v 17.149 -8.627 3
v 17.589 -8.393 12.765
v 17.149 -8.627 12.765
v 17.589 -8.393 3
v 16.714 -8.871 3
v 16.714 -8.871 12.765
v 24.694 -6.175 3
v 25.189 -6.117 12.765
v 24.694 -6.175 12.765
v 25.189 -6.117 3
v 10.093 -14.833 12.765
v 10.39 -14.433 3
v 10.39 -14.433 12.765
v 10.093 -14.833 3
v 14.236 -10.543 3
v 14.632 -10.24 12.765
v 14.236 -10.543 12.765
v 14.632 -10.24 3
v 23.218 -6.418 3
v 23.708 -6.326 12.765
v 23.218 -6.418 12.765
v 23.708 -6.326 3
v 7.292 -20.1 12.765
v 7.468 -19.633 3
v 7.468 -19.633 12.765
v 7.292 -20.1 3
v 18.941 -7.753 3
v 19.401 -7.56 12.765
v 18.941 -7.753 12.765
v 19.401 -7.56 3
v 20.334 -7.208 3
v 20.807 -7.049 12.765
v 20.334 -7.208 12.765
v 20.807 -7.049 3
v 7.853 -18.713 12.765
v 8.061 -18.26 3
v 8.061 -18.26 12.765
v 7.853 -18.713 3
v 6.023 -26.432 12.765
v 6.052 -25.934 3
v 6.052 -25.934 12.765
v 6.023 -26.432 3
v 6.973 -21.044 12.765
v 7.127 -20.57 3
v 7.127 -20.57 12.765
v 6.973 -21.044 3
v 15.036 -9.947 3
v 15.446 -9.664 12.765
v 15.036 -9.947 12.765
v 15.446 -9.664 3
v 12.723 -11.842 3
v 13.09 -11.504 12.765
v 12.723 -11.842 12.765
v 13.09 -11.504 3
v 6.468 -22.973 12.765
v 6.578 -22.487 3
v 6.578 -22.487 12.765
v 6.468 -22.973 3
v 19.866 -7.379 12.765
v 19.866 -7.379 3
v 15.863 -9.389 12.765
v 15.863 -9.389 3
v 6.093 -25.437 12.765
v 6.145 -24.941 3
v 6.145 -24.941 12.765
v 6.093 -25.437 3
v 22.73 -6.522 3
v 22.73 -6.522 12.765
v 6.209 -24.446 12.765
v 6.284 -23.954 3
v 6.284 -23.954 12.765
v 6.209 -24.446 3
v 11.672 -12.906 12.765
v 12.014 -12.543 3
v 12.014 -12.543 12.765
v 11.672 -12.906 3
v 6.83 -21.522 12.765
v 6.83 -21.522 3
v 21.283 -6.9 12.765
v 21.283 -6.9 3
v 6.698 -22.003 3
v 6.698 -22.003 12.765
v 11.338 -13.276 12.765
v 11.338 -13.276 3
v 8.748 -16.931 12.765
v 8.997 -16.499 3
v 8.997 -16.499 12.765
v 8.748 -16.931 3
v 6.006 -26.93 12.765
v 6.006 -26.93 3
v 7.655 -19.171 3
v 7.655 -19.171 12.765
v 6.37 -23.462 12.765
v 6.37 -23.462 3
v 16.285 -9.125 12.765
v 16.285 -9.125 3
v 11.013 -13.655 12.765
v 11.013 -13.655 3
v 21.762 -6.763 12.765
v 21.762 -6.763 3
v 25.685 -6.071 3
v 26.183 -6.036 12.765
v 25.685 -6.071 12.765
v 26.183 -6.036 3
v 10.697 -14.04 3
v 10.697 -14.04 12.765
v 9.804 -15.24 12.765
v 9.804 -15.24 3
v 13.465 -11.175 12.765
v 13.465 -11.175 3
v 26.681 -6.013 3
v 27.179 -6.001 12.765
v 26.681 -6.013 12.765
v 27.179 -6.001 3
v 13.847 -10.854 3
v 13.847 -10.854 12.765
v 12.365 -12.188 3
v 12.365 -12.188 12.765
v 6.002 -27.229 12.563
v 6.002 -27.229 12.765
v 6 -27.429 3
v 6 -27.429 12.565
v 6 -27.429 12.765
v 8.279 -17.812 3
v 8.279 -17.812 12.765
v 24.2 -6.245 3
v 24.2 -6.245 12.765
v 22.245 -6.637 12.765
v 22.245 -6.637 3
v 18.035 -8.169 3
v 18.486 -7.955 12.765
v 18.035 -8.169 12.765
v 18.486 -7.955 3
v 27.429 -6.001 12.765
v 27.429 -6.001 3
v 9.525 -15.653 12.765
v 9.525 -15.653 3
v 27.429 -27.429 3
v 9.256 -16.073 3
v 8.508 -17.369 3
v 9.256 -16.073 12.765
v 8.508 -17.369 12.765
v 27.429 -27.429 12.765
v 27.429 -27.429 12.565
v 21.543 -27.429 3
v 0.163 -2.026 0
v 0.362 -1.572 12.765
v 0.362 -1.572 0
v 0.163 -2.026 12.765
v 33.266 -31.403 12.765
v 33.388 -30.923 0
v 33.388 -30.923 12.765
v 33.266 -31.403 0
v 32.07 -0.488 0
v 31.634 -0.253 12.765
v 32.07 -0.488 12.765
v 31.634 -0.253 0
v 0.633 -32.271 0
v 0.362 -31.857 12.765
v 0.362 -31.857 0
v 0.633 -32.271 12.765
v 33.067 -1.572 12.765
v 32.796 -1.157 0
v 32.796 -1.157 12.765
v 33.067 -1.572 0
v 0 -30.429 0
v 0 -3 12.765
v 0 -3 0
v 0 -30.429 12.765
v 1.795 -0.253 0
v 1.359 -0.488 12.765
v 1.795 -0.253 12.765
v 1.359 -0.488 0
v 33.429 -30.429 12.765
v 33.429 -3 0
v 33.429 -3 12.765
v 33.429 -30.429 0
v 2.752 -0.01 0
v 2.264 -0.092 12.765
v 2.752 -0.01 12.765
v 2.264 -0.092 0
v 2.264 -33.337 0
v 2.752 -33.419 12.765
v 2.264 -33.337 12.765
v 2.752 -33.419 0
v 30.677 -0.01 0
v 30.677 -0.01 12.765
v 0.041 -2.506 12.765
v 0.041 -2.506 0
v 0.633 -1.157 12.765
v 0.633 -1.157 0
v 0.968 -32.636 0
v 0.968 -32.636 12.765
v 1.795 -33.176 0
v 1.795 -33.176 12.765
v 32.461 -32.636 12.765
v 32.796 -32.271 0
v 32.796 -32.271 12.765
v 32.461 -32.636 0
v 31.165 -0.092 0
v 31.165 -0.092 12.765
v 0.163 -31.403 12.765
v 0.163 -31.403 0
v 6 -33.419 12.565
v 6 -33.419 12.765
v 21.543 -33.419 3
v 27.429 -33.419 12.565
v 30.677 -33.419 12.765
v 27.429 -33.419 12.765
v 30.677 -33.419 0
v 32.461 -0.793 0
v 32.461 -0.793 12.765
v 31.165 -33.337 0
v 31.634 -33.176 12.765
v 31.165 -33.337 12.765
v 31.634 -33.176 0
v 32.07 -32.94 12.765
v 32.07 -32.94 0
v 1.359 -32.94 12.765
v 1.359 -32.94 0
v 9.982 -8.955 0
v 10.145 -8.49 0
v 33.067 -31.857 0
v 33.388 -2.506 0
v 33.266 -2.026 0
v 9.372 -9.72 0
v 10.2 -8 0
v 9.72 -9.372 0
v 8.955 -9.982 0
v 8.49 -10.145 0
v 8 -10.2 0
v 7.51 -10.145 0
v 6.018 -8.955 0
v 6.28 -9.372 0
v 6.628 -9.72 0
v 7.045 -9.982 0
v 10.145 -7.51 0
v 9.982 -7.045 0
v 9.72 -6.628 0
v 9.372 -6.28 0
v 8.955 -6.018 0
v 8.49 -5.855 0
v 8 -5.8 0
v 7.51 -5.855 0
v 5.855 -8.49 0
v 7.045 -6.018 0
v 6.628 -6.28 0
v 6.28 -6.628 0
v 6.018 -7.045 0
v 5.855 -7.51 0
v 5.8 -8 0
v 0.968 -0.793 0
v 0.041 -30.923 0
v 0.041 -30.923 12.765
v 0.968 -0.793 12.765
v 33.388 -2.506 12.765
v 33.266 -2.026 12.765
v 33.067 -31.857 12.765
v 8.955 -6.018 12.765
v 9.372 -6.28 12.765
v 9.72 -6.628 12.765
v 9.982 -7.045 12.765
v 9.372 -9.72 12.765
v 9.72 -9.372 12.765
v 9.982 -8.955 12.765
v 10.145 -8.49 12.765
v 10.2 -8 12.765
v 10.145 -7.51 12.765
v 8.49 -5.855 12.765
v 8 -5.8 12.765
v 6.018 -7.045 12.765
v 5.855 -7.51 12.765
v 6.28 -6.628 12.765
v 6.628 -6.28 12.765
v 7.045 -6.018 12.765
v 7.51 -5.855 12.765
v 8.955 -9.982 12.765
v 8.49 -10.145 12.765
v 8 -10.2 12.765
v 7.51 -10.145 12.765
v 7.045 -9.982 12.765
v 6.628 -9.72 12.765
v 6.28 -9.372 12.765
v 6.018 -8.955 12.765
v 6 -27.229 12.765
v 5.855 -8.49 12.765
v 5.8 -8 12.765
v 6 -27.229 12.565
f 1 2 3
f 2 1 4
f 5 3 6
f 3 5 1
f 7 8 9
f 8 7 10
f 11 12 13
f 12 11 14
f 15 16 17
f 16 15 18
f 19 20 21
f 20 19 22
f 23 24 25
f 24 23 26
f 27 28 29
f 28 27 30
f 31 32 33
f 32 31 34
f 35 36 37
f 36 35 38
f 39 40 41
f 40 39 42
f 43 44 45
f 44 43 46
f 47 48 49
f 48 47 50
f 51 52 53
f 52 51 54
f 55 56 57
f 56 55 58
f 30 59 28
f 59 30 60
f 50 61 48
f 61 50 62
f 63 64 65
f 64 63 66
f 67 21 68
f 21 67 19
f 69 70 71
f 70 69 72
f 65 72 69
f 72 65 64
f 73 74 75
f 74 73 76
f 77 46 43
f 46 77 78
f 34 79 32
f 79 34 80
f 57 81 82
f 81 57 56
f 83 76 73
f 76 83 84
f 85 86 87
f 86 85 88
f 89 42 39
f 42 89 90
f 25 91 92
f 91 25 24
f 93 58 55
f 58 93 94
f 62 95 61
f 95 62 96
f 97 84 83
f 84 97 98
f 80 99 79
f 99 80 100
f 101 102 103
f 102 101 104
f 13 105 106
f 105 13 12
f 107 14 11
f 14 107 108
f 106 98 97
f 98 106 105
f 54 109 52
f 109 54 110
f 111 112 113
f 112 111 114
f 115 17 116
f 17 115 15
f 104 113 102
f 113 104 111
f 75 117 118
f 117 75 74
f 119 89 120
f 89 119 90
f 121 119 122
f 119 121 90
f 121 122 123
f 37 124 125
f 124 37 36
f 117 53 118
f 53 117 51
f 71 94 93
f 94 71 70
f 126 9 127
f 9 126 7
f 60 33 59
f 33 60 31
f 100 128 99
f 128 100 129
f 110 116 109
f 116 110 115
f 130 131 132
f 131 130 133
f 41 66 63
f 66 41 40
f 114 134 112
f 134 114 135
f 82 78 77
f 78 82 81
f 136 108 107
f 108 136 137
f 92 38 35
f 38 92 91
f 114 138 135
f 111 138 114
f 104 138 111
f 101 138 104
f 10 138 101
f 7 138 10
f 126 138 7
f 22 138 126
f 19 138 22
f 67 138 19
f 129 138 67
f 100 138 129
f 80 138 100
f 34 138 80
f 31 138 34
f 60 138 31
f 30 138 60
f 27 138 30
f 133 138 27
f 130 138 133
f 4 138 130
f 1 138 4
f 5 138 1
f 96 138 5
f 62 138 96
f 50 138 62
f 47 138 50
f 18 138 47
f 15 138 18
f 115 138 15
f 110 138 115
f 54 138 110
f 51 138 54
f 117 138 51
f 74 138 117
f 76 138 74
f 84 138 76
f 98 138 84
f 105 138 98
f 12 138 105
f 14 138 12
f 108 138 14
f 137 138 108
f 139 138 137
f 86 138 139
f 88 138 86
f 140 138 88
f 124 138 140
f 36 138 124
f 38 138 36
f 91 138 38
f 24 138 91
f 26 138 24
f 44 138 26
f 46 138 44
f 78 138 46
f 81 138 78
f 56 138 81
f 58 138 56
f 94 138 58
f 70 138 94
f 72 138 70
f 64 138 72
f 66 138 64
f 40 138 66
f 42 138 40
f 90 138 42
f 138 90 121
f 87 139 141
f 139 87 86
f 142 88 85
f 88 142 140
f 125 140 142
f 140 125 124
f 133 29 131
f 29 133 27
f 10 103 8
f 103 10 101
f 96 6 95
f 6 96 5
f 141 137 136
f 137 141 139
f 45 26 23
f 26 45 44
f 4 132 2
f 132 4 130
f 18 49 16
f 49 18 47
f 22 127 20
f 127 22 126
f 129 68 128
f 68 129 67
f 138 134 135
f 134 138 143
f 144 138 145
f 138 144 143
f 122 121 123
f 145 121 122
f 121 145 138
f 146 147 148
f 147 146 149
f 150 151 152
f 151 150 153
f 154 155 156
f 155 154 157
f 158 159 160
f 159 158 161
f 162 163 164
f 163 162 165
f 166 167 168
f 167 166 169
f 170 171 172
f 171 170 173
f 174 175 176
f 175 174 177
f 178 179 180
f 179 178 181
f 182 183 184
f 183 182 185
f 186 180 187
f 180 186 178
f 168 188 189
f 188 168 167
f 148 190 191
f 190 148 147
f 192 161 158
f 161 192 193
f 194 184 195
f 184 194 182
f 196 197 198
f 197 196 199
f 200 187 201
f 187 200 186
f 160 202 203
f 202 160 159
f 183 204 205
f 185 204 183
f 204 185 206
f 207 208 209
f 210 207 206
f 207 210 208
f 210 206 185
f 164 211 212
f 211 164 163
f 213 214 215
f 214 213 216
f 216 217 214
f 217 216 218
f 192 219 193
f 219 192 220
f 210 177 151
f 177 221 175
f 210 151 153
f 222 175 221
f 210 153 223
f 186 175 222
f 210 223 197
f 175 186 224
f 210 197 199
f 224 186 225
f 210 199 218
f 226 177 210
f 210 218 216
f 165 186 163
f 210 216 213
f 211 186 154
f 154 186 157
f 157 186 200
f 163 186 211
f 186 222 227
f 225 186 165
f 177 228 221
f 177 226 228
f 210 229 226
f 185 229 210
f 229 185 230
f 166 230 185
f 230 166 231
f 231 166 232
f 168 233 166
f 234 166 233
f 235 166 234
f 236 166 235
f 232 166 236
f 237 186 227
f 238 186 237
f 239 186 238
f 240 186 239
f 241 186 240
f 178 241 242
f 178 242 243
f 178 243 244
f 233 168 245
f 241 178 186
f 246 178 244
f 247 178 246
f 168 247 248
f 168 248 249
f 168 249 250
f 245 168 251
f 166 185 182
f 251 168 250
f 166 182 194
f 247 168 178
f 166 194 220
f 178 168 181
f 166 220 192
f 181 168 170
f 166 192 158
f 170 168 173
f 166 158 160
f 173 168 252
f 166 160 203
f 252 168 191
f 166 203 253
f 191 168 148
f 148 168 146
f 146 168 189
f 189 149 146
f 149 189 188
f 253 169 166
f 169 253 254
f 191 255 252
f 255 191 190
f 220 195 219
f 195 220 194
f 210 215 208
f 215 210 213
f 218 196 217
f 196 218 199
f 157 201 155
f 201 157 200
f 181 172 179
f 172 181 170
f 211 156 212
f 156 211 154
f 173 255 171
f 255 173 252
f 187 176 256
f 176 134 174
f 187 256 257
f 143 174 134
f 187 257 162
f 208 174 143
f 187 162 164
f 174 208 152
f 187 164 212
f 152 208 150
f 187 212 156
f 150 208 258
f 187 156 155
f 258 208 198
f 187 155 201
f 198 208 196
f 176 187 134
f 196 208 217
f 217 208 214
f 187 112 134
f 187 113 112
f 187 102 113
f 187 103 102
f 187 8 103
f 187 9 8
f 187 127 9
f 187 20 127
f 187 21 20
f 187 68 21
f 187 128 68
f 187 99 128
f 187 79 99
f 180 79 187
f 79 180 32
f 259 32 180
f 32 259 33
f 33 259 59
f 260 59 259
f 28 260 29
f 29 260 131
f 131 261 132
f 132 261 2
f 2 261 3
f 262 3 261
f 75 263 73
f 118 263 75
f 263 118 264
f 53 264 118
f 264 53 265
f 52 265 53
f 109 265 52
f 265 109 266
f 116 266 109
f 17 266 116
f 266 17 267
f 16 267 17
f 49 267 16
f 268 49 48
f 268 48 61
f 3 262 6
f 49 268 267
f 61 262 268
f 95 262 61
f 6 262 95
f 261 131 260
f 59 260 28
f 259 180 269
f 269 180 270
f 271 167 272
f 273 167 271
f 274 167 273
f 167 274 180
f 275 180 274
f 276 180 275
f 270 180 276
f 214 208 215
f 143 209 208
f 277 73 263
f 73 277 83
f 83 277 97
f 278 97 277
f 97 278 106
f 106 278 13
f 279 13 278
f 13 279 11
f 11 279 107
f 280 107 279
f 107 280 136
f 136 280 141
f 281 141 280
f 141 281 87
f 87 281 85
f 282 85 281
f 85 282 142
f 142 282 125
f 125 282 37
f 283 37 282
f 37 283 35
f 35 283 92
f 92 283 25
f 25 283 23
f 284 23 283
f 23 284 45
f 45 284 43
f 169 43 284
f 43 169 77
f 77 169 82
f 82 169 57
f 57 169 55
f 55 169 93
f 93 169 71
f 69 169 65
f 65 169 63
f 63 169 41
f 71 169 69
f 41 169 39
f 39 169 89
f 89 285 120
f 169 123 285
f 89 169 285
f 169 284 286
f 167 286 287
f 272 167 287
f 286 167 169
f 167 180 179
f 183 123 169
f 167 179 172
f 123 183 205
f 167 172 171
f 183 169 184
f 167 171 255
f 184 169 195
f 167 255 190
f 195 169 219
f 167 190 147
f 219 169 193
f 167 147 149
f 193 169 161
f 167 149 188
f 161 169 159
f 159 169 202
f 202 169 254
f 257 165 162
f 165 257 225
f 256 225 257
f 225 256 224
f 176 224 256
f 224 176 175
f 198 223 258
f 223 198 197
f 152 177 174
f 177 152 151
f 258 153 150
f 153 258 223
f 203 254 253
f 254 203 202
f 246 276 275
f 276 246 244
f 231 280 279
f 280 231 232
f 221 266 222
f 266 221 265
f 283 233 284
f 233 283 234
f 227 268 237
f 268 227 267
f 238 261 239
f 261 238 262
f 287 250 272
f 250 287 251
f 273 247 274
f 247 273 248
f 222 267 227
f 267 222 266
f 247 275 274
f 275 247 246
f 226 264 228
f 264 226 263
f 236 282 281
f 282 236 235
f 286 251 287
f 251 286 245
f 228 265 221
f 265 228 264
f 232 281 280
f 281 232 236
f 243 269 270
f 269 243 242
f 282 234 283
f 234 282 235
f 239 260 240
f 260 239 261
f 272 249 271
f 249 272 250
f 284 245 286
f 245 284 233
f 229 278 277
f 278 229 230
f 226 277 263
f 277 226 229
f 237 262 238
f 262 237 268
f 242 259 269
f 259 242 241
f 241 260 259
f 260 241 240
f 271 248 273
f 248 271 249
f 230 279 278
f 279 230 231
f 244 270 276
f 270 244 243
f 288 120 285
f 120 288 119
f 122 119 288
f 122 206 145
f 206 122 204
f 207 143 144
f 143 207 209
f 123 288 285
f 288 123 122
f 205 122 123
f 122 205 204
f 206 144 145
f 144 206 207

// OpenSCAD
// file: functions.scad
/*******************************************************************

This OpenSCAD code and its rendered 3D model are part of the

	Kühling&Kühling RepRap Industrial 3D Printer


All details, BOM, assembling instructions and latest sources:
	http://kuehlingkuehling.de

Designed and developed by:
	Jonas Kühling <mail@jonaskuehling.de>
	Simon Kühling <mail@simonkuehling.de>

Licensed under:
	Creative Commons Attribution-ShareAlike
	CC BY-SA 3.0
	http://creativecommons.org/licenses/by-sa/3.0/

*******************************************************************/

module teardrop (r=4.5,h=20,alpha=45,teardropcorner=0,fulldrop=0){		// tear drop hole for top-centering
											// use teardropcorner=1 for bottom horizontal corners
	render()
	translate([-h/2,0,0])
		rotate([-270,0+(teardropcorner*180),90])
			difference(){
				linear_extrude(height=h){
					circle(r);
					polygon(points=[[0,0],[r*cos(alpha),r*sin(alpha)],[0,r/sin(alpha)],[-r*cos(alpha),r*sin(alpha)]], paths=[[0,1,2,3]]);
				}
				if(fulldrop==0) 
					translate([0,(r/sin(alpha))/2+r,h/2]) cube([2*r+2,r/sin(alpha),h+2],center=true);
			}
}

//teardrop(4.5,22,fulldrop=true);



module teardropcentering (r=4.5,h=20,alpha=45){				// tear drop hole for top-centering
	centering_offset_factor = 1.1;
	render()
	translate([-h/2,0,0])
		rotate([-270,0,90])
			difference(){
				linear_extrude(height=h){
					circle(r, $fn=24);
					polygon(points=[[0,0],[r*cos(alpha),r*sin(alpha)],[0,r/sin(alpha)],[-r*cos(alpha),r*sin(alpha)]], paths=[[0,1,2,3]]);
				}
				translate([0,(r/sin(alpha))/2+r*centering_offset_factor,h/2]) cube([2*r+2,r/sin(alpha),h+2],center=true);
			}
}

//teardropcentering();



module teardropcentering_half (r=4.5,h=20, bottom=0,alpha=45){				// tear drop hole for top-centering
																// upper half (bottom=0) or bottom half (bottom=1)
	centering_offset_factor = 1.2;
	render()
	translate([-h/2,0,0])
		rotate([-270,0,90])
			difference(){
				linear_extrude(height=h){
					circle(r, $fn=24);
					polygon(points=[[0,0],[r*cos(alpha),r*sin(alpha)],[0,r/sin(alpha)],[-r*cos(alpha),r*sin(alpha)]], paths=[[0,1,2,3]]);
				}
				translate([0,(r/sin(alpha))/2+r*centering_offset_factor,h/2]) cube([2*r+2,r/sin(alpha),h+2],center=true);
				translate([0,-(r*centering_offset_factor)/2-0.5+bottom*(r*centering_offset_factor+1),h/2]) cube([2*r+2,r*centering_offset_factor+1,h+2],center=true);
			}
}

//teardropcentering_half(bottom=0);


module polyhole(d,h){
	n = max(round(2 * d),3);
	cylinder(h = h, r = (d / 2) / cos (180 / n), $fn = n, center=true);
}



module roundcorner(radius,edge_length){
	render()
	translate([0,0,-1])
		difference(){
			translate([-1,-1,0])
				cube(size = [radius+1,radius+1,edge_length+2], center = false);
			translate(v = [radius,radius,-1])
				cylinder(h = edge_length+4, r=radius, center=false,$fs=0.1);
		}
}

//roundcorner(5,5);



module roundcorner_tear(radius,edge_length){
	render()
	difference(){
		translate([-1,-1,-1])
			cube(size = [edge_length+2, radius+1, radius+1], center = false);
		translate([(edge_length+4)/2-2, radius, radius])
			teardrop(radius, edge_length+4,teardropcorner=1);
	}
}

//roundcorner_tear(8,20);


module roundedge_tear(radius){
	render()
	difference(){
		translate([-1,-1,-1])
			cube(size = [radius+1, radius+1, radius+1], center = false);
		translate([radius,radius,radius])
			union(){
				sphere(r=radius, $fs=0.1);
				translate([0,0,-radius])
					cylinder(r1=(radius*sin(45))-(radius-(radius*sin(45))),r2=radius*sin(45),h=(radius-(radius*sin(45))), $fs=0.1);
			}
	}
}

//roundedge_tear(20);



module roundedge(radius){
	render()
	difference(){
		translate([-1,-1,-1])
			cube(size = [radius+1, radius+1, radius+1], center = false);
		translate([radius,radius,radius])
			sphere(r=radius, $fs=0.1);
	}
}

//roundedge(5);


module nut_trap(nut_wrench_size,trap_height,vertical=0, clearance=0.2,center=true){		// M3 wrench size = 5.5
	radius = cornerdiameter(nut_wrench_size+2*clearance) /2;
	rotate([0,vertical*90,0])
		cylinder(h = trap_height, r = radius, center=center, $fn = 6);
}

//nut_trap(5,5,0);

module nut_slot(nut_wrench_size,nut_height, nut_elevation,vertical=0, clearance=0.2){		// M3 wrench size = 5.5
	radius = cornerdiameter(nut_wrench_size+2*clearance) /2;
	slot_height = nut_height+2*clearance;
	slot_width = nut_wrench_size+2*clearance;
	rotate([0,vertical*270,0]){
		cylinder(h = slot_height, r = radius, center=true, $fn = 6);
		translate([0,-slot_width/2,-slot_height/2]) cube([nut_elevation+1,slot_width,slot_height]);
	}
}

//nut_slot(5.5,3,4,1);

function cornerdiameter(wrench_size) =  2* ((wrench_size)/2)/ cos(180/6);
function cornerdiameter_8(wrench_size) =  2* ((wrench_size)/2)/ cos(180/8);
// main file
/*******************************************************************

This OpenSCAD code and its rendered 3D model are part of the

	Kühling&Kühling RepRap Industrial 3D Printer


All details, BOM, assembling instructions and latest sources:
	http://kuehlingkuehling.de

Designed and developed by:
	Jonas Kühling <mail@jonaskuehling.de>
	Simon Kühling <mail@simonkuehling.de>

Licensed under:
	Creative Commons Attribution-ShareAlike
	CC BY-SA 3.0
	http://creativecommons.org/licenses/by-sa/3.0/

*******************************************************************/

include <configuration.scad>


frame_led_profile_side_long = 15;			// aluminium L-profile
frame_led_profile_side_short = 10;			// aluminium L-profile
frame_led_profile_thickness = 2;				// aluminium L-profile

// internal calculation for led profile clearance
alpha = atan((frame_led_profile_side_short-frame_led_profile_thickness)/(frame_led_profile_side_long-frame_led_profile_thickness));
hypotenuse = ((frame_led_profile_side_short-frame_led_profile_thickness)/sin(alpha)) + (frame_led_profile_thickness/cos(alpha)) + (frame_led_profile_thickness/sin(alpha));
side_1 = frame_led_profile_side_long + (frame_led_profile_thickness/sin(alpha)*cos(alpha));
side_2 = frame_led_profile_side_short + (frame_led_profile_thickness/cos(alpha)*sin(alpha));
height = (side_1*side_2)/hypotenuse;
height_q = (side_1*side_1)/hypotenuse;

frame_led_mount_height = height + clearance + wall;
frame_led_mount_side = hypotenuse + 4*wall;



// RENDER
translate([0,0,frame_led_mount_height]) rotate([180,0,0])
frame_led_mount(option=2);



// option = 0 for two led connections
// option = 1 for left led connection
// option = 2 for right led connection

module frame_led_mount(option=0){
	difference(){

		// main body
		hull(){
			translate([wall,wall,0])
				cylinder(r=wall,h=frame_led_mount_height);
			translate([frame_led_mount_side-wall,wall,0])
				cylinder(r=wall,h=frame_led_mount_height);
			translate([wall,frame_led_mount_side-wall,0])
				cylinder(r=wall,h=frame_led_mount_height);
			translate([frame_led_mount_side-wall,frame_led_mount_side-wall,0])
				cylinder(r=wall,h=frame_led_mount_height);
		}

		// frame enclosure screw hole
		translate([2*wall+clearance+frame_screw_dia/2-clearance,2*wall+clearance+frame_screw_dia/2-clearance,-1])
			cylinder(r=frame_screw_dia/2+clearance,h=frame_led_mount_height+2);

/*
		// led mount aluminium profile clearance
		translate([frame_led_mount_side-2*wall,2*wall,0])
			rotate([0,0,90]) rotate([90,0,0])
				linear_extrude(height=frame_led_mount_side)
					polygon(points=[[0,-1],[0,clearance],[height_q,height+clearance],[hypotenuse,clearance],[hypotenuse,-1]]);
*/

		if (option == 0 || option == 1)
			translate([frame_led_mount_side-2*wall-clearance,2*wall,0])
				rotate([0,0,90]) rotate([90,0,0])
					linear_extrude(height=frame_led_mount_side)
						polygon(points=[[0,-1],[0,clearance],[height_q,height+clearance],[hypotenuse,clearance],[hypotenuse,-1]]);
		if (option == 0 || option == 2)
			rotate([0,0,90])
				mirror([0,1,0])
					translate([frame_led_mount_side-2*wall-clearance,2*wall,0])
						rotate([0,0,90]) rotate([90,0,0])
							linear_extrude(height=frame_led_mount_side)
								polygon(points=[[0,-1],[0,clearance],[height_q,height+clearance],[hypotenuse,clearance],[hypotenuse,-1]]);

		// led strip cable clearance
		intersection(){
			translate([frame_led_mount_side-2*wall,frame_led_mount_side-2*wall,-wall])
				cylinder(r=hypotenuse,h=frame_led_mount_height);
			translate([-2*wall,-2*wall,-wall])
				cube([frame_led_mount_side,frame_led_mount_side,frame_led_mount_height]);
		}

	}

}
